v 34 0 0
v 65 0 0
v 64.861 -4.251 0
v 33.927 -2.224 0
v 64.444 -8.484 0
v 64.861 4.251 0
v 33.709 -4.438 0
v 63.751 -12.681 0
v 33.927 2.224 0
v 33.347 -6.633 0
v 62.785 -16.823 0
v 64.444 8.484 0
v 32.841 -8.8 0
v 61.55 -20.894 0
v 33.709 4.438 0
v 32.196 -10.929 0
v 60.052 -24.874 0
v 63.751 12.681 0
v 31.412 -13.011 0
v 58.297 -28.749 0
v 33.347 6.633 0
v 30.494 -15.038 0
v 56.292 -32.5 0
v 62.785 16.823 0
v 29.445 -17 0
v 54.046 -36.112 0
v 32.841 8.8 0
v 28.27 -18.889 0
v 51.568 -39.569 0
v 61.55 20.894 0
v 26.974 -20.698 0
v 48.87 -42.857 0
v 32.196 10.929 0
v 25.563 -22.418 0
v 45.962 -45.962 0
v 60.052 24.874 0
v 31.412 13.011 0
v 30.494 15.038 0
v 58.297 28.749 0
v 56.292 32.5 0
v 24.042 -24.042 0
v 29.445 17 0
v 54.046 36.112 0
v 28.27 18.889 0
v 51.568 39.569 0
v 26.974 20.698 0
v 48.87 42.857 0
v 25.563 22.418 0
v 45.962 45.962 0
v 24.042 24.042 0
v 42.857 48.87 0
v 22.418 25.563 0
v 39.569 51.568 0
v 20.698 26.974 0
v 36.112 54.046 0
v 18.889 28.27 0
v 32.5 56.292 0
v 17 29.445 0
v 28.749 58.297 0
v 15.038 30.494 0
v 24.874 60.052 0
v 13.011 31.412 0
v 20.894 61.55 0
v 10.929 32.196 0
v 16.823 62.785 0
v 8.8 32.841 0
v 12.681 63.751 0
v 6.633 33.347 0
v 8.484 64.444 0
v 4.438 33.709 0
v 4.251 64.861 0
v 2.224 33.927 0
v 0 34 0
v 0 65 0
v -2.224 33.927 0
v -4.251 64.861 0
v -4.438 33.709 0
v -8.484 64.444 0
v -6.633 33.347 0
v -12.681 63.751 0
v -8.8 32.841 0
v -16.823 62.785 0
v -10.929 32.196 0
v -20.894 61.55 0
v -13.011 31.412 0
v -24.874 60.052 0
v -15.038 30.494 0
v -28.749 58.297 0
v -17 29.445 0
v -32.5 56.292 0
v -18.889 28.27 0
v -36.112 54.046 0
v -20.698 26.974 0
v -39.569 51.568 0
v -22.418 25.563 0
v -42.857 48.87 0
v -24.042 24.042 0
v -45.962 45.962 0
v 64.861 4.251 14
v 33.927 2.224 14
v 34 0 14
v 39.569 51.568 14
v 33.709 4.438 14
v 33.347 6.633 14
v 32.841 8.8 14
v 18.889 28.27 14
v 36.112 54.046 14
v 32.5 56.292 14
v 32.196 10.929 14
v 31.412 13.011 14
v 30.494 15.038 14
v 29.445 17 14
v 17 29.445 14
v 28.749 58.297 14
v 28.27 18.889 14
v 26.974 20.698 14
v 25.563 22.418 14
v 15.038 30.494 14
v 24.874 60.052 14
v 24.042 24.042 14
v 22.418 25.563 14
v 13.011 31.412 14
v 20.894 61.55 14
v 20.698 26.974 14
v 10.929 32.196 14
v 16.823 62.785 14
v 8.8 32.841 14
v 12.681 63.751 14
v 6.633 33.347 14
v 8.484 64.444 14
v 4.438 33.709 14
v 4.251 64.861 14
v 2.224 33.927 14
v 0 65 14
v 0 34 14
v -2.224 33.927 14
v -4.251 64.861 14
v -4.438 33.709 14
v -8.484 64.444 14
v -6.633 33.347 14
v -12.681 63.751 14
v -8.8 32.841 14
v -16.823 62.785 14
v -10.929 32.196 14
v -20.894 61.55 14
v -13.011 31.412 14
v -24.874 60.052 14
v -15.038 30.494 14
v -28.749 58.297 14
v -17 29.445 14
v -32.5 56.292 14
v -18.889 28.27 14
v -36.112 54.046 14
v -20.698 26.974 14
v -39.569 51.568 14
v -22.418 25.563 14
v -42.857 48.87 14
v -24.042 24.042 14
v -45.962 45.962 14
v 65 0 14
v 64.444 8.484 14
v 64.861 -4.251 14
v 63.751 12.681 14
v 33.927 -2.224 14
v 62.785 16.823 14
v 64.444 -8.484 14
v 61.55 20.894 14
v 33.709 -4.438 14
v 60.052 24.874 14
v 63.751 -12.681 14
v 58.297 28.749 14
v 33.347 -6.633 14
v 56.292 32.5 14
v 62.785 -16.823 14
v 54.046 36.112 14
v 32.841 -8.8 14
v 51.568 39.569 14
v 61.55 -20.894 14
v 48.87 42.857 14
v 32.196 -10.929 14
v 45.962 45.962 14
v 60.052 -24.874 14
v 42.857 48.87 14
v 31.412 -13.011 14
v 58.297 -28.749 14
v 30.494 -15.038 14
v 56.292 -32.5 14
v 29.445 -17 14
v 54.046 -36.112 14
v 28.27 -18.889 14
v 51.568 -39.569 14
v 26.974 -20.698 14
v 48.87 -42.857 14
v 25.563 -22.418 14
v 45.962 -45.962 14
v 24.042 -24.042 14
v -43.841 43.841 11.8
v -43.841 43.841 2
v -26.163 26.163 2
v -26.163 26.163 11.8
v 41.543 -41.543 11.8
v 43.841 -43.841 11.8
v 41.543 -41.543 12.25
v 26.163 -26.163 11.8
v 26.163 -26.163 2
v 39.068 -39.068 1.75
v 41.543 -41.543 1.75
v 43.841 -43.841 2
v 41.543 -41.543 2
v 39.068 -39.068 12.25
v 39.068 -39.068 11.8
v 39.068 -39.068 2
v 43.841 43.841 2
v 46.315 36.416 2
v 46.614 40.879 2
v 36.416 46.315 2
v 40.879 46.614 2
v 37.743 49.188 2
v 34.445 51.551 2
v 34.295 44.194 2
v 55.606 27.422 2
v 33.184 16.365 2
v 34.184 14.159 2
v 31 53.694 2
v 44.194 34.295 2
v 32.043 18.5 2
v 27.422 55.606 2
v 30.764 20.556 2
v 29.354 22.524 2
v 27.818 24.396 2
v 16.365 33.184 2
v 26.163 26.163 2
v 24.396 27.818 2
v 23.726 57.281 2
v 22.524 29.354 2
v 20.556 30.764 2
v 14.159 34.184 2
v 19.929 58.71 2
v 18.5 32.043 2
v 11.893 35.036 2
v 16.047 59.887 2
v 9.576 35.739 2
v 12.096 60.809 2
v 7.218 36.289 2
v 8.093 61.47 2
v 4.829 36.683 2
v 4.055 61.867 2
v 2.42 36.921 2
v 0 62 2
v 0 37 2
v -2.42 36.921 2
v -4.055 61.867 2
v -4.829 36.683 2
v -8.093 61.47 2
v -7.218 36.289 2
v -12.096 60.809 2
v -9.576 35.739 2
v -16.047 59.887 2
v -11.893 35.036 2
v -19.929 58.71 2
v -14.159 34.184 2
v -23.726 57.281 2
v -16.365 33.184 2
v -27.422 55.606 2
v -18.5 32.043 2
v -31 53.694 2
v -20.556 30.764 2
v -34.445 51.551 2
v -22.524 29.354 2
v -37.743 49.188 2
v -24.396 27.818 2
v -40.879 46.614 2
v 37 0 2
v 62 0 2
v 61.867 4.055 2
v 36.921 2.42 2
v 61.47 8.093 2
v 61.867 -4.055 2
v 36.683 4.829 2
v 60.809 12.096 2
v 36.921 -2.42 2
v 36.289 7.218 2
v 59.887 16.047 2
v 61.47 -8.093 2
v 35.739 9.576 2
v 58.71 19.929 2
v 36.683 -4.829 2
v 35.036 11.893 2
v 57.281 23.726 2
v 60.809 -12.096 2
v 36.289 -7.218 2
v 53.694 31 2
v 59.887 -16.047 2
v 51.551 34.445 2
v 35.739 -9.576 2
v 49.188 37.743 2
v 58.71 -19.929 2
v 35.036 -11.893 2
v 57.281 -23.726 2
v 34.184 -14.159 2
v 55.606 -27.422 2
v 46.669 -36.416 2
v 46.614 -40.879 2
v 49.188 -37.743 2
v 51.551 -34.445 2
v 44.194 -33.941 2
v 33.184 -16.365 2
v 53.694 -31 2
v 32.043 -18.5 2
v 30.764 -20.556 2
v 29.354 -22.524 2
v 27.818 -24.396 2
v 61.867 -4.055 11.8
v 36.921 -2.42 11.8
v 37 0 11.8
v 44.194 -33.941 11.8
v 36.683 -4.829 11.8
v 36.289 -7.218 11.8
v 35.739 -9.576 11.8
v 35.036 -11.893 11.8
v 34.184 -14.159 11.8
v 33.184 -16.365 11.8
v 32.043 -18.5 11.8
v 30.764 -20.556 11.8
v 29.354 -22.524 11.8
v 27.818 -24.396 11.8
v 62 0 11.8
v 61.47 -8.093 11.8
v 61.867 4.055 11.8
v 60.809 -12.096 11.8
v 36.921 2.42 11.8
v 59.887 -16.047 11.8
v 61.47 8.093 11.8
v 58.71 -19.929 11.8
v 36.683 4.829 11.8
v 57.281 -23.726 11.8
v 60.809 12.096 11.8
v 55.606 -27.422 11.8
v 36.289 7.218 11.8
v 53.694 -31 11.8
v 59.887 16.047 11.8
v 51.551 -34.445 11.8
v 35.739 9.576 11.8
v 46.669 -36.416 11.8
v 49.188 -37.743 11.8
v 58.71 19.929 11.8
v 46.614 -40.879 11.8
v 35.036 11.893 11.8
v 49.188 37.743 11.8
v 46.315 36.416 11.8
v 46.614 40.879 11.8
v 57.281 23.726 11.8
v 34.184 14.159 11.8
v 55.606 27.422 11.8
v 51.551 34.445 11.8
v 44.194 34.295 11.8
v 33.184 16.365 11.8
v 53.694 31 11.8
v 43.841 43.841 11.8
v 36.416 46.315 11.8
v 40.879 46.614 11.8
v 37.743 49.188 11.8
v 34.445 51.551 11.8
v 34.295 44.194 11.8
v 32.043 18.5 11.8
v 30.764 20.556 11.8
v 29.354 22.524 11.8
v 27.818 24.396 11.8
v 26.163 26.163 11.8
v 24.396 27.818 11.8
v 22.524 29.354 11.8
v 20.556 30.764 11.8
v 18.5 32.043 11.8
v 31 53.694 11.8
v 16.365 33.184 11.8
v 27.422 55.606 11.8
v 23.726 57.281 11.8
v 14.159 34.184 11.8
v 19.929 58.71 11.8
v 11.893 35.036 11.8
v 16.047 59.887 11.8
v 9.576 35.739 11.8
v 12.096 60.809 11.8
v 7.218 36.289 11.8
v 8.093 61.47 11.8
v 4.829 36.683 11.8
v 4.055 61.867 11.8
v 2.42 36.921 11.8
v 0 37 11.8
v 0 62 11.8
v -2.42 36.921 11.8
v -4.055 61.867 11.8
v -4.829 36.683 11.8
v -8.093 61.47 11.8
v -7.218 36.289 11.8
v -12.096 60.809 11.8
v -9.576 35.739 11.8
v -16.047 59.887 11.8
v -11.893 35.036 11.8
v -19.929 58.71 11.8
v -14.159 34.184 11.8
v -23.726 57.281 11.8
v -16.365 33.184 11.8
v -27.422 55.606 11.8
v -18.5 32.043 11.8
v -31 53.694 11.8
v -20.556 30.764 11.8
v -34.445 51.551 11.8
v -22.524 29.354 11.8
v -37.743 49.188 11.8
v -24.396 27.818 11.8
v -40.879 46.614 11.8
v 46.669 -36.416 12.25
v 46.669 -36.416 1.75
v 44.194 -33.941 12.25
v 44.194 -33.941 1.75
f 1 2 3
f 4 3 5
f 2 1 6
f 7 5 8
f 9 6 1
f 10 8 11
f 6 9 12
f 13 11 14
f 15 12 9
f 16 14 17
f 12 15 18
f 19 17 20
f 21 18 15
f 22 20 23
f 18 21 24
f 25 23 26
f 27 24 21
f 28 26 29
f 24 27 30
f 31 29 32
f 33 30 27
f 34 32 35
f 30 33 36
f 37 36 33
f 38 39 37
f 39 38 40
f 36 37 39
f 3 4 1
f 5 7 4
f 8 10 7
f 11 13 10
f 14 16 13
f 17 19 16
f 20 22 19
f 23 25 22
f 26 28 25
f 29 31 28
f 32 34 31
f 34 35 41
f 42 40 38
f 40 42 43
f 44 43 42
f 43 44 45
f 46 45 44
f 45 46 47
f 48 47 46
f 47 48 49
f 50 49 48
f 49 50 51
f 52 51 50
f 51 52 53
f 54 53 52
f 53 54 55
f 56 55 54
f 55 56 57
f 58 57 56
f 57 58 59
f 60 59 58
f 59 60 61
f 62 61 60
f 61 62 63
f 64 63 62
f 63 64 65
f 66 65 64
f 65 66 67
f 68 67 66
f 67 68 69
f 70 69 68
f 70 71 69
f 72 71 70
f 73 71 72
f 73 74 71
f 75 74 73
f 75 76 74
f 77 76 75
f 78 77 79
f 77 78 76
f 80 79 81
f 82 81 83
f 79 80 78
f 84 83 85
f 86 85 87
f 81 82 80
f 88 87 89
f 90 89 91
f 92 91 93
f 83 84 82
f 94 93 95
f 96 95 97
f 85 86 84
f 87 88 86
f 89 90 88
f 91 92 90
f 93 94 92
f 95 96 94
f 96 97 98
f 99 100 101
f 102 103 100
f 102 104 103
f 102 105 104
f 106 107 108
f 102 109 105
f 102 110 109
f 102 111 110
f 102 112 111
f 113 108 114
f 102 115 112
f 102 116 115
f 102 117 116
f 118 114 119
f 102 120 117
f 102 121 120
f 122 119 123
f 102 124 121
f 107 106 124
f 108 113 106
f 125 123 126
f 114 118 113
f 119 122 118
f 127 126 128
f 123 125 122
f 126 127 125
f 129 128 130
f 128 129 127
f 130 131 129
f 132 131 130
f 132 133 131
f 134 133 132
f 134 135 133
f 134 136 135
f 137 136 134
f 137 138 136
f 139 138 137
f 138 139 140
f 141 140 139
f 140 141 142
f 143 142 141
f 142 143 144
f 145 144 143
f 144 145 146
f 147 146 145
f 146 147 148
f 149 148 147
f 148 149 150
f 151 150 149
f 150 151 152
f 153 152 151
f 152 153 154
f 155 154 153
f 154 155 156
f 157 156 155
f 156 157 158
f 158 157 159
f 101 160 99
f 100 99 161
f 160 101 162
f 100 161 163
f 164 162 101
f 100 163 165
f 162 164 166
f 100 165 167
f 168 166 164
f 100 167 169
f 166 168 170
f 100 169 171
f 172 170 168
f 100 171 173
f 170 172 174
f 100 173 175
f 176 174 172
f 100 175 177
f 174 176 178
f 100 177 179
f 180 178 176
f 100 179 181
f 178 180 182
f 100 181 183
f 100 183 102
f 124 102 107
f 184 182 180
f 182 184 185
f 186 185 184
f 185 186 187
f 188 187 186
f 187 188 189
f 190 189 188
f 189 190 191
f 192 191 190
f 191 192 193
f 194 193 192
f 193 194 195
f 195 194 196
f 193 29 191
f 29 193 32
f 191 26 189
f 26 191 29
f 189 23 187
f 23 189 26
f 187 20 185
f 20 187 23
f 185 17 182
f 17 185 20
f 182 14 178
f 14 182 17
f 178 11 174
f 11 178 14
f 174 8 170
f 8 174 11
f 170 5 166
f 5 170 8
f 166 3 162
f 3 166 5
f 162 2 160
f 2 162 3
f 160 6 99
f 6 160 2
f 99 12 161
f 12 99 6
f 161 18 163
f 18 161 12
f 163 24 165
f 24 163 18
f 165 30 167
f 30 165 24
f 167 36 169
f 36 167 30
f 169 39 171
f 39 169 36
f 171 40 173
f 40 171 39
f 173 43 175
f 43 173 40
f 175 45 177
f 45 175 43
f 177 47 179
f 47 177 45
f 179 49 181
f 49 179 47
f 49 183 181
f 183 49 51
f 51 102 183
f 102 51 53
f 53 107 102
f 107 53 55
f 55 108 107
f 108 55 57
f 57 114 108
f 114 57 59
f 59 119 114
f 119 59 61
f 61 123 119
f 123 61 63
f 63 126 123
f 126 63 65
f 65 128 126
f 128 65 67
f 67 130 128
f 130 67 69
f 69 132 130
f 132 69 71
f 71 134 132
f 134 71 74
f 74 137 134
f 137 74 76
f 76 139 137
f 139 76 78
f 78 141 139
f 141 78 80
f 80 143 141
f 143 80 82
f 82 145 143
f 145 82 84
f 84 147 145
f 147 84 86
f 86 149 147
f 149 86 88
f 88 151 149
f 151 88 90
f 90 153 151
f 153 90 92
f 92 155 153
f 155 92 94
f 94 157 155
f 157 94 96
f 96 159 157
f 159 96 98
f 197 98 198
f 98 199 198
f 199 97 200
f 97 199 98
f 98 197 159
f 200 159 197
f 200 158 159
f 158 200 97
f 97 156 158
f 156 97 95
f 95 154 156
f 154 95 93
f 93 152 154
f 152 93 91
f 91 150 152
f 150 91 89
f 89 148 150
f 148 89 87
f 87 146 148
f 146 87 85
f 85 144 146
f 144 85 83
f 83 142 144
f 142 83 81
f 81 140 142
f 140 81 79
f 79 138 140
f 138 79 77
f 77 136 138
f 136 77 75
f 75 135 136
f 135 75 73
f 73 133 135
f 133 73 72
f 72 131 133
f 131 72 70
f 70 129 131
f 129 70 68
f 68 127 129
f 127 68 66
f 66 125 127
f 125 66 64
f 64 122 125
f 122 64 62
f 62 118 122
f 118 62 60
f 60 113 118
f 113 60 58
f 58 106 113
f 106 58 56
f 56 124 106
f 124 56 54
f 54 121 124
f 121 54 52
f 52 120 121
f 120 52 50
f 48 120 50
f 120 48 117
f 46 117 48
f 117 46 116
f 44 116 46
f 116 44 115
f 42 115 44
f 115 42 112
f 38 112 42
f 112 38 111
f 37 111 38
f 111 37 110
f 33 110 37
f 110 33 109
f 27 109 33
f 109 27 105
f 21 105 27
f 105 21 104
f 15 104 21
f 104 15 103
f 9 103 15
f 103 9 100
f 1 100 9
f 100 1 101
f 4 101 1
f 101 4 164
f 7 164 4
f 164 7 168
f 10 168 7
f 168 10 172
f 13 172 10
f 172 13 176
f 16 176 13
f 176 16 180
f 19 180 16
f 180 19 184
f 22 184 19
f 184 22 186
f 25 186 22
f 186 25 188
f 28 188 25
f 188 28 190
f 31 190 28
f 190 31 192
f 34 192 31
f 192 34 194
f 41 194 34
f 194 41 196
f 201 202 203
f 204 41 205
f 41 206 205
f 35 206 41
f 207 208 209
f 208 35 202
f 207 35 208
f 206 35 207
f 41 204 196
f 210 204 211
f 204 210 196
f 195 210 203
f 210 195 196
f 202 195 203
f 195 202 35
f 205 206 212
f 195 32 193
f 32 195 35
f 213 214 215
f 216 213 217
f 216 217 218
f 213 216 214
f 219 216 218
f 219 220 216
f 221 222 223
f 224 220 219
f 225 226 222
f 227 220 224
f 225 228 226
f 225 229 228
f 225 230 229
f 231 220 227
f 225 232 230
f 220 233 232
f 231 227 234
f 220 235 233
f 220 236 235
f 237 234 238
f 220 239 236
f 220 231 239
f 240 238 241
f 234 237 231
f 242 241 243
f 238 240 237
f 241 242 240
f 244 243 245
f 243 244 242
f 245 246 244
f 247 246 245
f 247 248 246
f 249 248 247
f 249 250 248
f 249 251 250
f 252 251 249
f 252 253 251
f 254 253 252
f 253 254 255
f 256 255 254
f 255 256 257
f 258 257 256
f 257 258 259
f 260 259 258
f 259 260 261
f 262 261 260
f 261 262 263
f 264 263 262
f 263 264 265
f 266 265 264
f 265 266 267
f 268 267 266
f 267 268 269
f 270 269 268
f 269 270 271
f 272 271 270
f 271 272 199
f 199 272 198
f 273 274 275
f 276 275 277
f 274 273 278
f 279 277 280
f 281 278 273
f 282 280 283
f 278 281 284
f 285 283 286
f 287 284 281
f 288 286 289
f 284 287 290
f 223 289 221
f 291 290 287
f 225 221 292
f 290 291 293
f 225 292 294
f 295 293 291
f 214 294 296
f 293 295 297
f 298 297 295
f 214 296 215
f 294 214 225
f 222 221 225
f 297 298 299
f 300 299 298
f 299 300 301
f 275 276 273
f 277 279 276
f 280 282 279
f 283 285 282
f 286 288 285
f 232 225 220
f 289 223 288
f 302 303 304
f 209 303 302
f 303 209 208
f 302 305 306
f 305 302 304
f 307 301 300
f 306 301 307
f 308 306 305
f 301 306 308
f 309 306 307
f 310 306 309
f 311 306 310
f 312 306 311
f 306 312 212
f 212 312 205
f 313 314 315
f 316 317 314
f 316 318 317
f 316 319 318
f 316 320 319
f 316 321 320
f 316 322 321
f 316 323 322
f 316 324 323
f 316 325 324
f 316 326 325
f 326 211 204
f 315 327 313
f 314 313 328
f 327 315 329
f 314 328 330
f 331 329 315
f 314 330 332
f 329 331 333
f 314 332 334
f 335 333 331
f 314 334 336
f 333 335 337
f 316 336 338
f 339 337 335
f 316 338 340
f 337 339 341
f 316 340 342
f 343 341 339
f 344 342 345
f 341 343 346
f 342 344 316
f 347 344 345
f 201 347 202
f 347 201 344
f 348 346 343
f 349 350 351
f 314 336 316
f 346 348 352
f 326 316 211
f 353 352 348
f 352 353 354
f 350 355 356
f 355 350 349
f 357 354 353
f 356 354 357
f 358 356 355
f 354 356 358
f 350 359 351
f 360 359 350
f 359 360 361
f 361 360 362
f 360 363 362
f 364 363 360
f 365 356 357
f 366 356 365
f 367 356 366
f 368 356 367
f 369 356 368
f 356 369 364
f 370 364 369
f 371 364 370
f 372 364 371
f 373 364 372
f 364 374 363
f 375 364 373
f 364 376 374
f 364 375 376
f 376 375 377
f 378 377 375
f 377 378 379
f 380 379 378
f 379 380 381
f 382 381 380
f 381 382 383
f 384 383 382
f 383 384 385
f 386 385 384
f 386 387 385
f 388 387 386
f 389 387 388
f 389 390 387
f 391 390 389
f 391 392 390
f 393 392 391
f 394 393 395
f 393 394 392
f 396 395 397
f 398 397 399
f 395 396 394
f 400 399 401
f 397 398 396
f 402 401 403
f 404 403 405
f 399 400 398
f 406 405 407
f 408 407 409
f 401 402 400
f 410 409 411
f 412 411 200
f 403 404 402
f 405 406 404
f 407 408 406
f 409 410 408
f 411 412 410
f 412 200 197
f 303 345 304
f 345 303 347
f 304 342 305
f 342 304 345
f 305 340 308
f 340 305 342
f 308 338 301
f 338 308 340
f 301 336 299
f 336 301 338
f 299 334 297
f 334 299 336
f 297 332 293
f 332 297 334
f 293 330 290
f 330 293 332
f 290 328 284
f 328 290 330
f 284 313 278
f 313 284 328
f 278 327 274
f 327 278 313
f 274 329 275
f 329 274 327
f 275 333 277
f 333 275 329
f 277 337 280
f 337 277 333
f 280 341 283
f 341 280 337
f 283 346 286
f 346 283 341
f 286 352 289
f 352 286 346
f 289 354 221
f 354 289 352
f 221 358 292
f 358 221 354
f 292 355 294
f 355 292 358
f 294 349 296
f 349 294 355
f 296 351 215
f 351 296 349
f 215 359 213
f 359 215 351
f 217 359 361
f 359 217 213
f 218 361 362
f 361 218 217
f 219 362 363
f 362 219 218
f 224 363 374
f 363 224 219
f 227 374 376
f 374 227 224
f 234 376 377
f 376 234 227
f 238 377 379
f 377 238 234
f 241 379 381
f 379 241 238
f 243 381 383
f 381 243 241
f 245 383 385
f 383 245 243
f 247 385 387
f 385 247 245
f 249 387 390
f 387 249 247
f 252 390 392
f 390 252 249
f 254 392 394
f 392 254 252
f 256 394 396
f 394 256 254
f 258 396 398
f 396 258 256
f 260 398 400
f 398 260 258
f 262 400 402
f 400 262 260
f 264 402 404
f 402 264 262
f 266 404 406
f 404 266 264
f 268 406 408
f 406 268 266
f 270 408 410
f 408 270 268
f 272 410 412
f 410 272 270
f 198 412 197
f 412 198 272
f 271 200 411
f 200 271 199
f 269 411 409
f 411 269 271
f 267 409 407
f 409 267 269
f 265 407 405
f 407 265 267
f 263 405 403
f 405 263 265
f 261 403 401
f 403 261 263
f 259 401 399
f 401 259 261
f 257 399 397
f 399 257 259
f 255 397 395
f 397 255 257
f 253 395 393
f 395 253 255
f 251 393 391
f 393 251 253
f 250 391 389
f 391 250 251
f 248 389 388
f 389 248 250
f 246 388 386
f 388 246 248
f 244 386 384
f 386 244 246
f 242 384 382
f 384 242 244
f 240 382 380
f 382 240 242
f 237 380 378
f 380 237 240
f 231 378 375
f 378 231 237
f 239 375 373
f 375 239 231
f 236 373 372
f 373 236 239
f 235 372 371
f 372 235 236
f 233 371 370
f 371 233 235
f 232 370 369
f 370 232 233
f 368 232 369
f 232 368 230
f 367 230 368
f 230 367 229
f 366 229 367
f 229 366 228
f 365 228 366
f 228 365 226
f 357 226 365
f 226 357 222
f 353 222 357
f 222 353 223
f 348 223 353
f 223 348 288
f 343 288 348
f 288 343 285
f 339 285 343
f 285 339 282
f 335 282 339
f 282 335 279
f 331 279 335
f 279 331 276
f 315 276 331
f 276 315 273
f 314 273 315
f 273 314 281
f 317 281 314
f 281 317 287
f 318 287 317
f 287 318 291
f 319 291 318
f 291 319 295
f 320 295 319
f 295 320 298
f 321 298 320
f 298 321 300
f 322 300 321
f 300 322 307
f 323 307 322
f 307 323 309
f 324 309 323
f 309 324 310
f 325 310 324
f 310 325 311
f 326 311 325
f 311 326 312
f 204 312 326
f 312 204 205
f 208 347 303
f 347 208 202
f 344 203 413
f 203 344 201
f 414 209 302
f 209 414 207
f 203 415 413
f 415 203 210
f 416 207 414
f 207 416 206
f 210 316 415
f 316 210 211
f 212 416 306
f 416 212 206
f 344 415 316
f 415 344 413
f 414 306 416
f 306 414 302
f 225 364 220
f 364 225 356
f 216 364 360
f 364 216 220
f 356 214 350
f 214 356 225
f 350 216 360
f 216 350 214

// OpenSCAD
// TS-PET-C07 - 90 Degree Track Corner
$fn = 96; seg_angle = 90; track_outer_r = 65; track_inner_r = 34; track_h = 14; floor_t = 2; roof_t = 2.2; join_w = 14; join_t = 3; join_h = 10;
module arc2d(ro, ri, ang) { difference() { intersection(){ circle(r=ro); rotate([0,0,ang/2]) translate([0,-ro]) square([ro*2, ro*2]); rotate([0,0,-ang/2]) translate([-ro,-ro]) square([ro*2, ro*2]); } intersection(){ circle(r=ri); rotate([0,0,ang/2]) translate([0,-ro]) square([ro*2, ro*2]); rotate([0,0,-ang/2]) translate([-ro,-ro]) square([ro*2, ro*2]); } } }
difference() { linear_extrude(height = track_h) arc2d(track_outer_r, track_inner_r, seg_angle); translate([0,0,floor_t]) linear_extrude(height = track_h-floor_t-roof_t) arc2d(track_outer_r-3, track_inner_r+3, seg_angle); rotate([0,0,-seg_angle/2]) translate([track_outer_r - 8,0,track_h/2]) cube([join_t + 0.5, join_w + 0.5, join_h + 0.5], center = true);} rotate([0,0,seg_angle/2]) translate([track_outer_r - 8,0,track_h/2]) cube([join_t, join_w, join_h], center = true);
